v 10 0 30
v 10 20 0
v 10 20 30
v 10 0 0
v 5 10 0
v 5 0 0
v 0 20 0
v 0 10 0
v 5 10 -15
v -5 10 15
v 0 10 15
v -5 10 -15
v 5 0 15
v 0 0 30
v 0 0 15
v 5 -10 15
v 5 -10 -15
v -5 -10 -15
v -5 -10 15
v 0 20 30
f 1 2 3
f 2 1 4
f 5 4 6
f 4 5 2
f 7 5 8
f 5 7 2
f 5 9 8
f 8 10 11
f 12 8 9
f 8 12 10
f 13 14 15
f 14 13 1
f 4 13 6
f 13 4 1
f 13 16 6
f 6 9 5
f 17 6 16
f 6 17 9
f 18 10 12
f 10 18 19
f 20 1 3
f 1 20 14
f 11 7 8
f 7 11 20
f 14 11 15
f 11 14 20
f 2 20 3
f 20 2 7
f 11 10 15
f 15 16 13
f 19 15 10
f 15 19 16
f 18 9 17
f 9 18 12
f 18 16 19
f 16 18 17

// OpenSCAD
// Simple cube with size parameter
cube(10);

// Cube with center parameter
cube(10, center=true);

// Cube with named size parameter
cube(size=10);

// Cube with named parameters
cube(size=10, center=true);

// Cube with vector size parameter
cube([10, 20, 30]);

// Cube with named vector size parameter
cube(size=[10, 20, 30]);

// Cube with vector size and center parameters
cube([10, 20, 30], center=true);

// Cube with named vector size and center parameters
cube(size=[10, 20, 30], center=true);

// Cube with default size when no parameters are provided
cube();
